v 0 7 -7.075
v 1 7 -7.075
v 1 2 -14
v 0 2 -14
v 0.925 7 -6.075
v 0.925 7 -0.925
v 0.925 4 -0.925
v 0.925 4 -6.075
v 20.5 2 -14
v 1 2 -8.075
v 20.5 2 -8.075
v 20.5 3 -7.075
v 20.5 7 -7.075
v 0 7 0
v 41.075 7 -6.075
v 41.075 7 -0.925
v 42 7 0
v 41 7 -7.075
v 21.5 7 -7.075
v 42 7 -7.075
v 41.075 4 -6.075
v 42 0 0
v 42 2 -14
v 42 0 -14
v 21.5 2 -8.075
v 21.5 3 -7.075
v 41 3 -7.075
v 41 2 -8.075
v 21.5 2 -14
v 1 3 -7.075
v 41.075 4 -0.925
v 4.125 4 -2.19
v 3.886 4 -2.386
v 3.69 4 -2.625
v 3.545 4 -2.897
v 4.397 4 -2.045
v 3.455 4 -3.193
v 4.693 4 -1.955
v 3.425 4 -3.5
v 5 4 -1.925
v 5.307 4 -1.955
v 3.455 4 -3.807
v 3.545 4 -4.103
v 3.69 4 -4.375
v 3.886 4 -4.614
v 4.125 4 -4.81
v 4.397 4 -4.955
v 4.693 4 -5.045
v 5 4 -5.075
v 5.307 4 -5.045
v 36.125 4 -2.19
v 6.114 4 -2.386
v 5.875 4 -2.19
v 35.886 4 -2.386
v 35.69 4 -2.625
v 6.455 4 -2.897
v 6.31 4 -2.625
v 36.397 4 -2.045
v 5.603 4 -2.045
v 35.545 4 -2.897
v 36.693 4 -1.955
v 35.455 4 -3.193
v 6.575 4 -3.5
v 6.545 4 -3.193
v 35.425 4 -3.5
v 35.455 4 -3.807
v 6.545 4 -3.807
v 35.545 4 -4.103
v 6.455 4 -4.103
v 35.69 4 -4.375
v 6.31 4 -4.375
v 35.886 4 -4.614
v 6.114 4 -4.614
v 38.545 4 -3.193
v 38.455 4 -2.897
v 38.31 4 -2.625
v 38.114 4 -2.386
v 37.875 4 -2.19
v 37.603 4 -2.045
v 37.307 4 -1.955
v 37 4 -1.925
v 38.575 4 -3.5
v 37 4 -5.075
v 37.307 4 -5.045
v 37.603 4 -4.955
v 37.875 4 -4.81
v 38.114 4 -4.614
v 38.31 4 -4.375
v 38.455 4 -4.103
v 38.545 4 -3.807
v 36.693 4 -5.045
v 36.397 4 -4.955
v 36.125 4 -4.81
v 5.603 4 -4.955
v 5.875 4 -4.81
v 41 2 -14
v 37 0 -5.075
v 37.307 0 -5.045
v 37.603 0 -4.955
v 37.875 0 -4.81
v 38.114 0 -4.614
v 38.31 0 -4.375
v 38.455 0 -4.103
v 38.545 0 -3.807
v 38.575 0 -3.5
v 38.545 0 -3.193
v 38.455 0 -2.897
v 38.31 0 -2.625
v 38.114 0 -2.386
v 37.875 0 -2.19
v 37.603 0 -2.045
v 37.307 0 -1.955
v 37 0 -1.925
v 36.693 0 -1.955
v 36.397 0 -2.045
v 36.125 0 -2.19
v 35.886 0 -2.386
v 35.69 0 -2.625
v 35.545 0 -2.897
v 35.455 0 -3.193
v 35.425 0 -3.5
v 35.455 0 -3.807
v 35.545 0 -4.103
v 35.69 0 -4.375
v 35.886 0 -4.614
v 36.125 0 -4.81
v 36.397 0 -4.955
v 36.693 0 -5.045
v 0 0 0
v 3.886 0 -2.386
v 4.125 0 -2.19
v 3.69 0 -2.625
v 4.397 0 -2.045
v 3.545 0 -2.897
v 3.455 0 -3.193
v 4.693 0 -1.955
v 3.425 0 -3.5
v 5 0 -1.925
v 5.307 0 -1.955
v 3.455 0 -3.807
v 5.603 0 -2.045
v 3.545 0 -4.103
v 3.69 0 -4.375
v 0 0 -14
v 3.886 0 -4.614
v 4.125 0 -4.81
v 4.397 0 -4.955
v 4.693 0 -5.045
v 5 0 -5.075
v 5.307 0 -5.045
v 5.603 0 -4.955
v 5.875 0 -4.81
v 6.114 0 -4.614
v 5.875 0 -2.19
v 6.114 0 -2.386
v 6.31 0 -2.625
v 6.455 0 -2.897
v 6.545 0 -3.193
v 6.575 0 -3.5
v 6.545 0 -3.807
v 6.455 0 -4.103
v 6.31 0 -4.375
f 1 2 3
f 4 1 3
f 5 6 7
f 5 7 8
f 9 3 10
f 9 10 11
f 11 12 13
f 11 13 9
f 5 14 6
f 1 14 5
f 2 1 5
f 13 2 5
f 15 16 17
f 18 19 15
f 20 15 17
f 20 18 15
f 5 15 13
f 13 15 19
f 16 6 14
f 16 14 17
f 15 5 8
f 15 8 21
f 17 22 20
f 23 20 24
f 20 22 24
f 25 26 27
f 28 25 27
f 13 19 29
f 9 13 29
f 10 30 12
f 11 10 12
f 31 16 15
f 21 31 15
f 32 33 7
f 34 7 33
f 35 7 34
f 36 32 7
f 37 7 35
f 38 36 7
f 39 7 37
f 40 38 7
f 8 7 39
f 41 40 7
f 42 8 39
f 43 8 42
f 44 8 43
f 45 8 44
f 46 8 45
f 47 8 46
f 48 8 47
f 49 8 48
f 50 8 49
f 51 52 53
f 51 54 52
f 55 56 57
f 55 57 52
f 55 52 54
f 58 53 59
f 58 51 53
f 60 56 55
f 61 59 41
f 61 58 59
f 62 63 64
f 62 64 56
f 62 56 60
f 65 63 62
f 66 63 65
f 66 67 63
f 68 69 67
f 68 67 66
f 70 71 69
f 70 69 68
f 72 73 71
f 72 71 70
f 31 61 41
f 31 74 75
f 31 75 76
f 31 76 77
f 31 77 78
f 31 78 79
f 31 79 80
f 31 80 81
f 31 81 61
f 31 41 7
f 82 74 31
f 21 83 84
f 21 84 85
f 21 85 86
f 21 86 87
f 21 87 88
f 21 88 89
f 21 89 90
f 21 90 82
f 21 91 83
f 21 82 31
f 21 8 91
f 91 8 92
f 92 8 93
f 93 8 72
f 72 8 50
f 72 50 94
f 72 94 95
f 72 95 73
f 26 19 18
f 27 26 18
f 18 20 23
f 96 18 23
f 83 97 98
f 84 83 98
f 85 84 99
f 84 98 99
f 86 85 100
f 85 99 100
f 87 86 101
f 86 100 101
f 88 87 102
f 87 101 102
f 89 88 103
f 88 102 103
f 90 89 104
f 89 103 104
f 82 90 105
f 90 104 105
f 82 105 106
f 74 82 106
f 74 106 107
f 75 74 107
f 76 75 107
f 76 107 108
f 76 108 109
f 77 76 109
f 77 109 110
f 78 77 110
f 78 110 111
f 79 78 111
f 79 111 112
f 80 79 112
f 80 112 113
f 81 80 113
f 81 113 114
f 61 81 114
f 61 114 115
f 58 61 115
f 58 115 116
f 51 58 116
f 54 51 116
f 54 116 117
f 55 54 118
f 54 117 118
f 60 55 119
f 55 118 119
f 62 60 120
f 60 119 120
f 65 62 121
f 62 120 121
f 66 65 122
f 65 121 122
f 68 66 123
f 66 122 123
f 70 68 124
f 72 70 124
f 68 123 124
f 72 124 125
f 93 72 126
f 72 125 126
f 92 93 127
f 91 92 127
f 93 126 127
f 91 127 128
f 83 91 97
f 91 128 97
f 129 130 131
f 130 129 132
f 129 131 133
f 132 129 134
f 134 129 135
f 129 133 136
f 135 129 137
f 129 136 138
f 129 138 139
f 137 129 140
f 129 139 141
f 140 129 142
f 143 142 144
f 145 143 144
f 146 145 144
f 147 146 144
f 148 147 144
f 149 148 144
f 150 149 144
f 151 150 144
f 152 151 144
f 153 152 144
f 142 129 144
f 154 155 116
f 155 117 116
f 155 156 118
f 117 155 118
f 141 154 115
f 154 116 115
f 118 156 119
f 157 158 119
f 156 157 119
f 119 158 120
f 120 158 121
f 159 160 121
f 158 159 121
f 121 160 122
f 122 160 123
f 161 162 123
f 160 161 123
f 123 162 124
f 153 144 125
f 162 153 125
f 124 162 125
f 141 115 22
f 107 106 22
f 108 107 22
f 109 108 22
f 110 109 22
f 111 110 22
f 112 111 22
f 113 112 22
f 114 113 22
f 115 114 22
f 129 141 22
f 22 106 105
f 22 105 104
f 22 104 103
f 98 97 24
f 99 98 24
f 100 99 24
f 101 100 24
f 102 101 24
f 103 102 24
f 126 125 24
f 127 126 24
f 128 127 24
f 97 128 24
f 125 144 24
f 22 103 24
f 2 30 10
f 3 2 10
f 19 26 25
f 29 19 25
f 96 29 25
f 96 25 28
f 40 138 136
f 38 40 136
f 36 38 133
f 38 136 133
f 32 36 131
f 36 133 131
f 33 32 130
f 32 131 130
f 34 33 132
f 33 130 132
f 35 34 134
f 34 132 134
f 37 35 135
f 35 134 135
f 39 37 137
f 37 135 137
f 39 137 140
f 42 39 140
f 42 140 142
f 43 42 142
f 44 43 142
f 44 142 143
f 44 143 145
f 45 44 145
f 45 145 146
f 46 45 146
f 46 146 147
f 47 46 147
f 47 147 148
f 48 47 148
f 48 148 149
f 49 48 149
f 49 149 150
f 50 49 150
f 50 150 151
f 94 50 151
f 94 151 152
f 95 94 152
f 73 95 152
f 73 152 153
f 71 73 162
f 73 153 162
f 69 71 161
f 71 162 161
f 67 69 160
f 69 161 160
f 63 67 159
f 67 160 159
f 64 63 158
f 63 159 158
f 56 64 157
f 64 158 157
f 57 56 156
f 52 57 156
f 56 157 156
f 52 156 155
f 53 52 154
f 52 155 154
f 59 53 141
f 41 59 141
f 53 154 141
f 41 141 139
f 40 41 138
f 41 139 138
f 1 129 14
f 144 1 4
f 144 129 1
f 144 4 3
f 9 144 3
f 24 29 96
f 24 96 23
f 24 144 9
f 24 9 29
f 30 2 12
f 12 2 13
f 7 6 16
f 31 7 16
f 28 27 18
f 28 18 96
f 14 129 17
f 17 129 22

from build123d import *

# Parameters (mm, degrees)
SKETCH1_W               = 42
SKETCH1_H               = 7
RISER_DEPTH             = 7
SKETCH2_R               = 1.575
MOUNTING_HOLES_DEPTH    = 44.150898021
SKETCH3_W               = 40.15
SKETCH3_H               = 5.15
RECESS_DEPTH            = 3
SKETCH4_W               = 42
SKETCH4_H               = 7
FLANGE_DEPTH            = 7
SKETCH5_W               = 19.5
SKETCH5_H               = 6.925
FLANGE_CUTOUT_DEPTH     = 5
ANGLE_CUTOUT_DEPTH      = 27.594172294
ANGLE_CUTOUT_DEPTH_BACK = 27.594172294
FLANGE_CHAMFER_1_SIZE   = 1
FLANGE_CHAMFER_2_SIZE   = 1


with BuildPart() as part:
    # Sketch1 → Riser (new body)
    with BuildSketch(Plane(origin=(0, 0, 0), x_dir=(1, 0, 0), z_dir=(0, 1, 0))):
        with Locations((21, 3.5)):
            Rectangle(SKETCH1_W, SKETCH1_H)
    extrude(amount=RISER_DEPTH)

    # Sketch2 → Mounting Holes (cut, through all)
    with BuildSketch(Plane.XZ):
        with Locations(Location((5, -3.5, 0), (0, 0, 90))):
            Circle(SKETCH2_R)
        with Locations(Location((37, -3.5, 0), (0, 0, 270))):
            Circle(SKETCH2_R)
    extrude(amount=-MOUNTING_HOLES_DEPTH, mode=Mode.SUBTRACT)

    # Sketch3 → Recess (cut)
    with BuildSketch(Plane(origin=(0, 7, 0), x_dir=(1, 0, 0), z_dir=(0, 1, 0))):
        with Locations((21, 3.5)):
            Rectangle(SKETCH3_W, SKETCH3_H)
    extrude(amount=-RECESS_DEPTH, mode=Mode.SUBTRACT)

    # Sketch4 → Flange (add)
    with BuildSketch(Plane(origin=(0, 0, 0), x_dir=(1, 0, 0), z_dir=(0, 1, 0))):
        with Locations((21, 10.5)):
            Rectangle(SKETCH4_W, SKETCH4_H)
    extrude(amount=FLANGE_DEPTH)

    # Sketch5 → Flange Cutout (cut)
    with BuildSketch(Plane(origin=(0, 7, 0), x_dir=(1, 0, 0), z_dir=(0, 1, 0))):
        with Locations((10.75, 10.5375)):
            Rectangle(SKETCH5_W, SKETCH5_H)
        with Locations((31.25, 10.5375)):
            Rectangle(SKETCH5_W, SKETCH5_H)
    extrude(amount=-FLANGE_CUTOUT_DEPTH, mode=Mode.SUBTRACT)

    # Sketch7 → Angle Cutout (cut, two sides: drawn at the far end of the back side and taken through both)
    with BuildSketch(Plane.ZY.offset(-20.5).offset(-ANGLE_CUTOUT_DEPTH_BACK)):
        Polygon((-7.075, 7), (-14, 2), (-14, 7), align=None)
    extrude(amount=ANGLE_CUTOUT_DEPTH + ANGLE_CUTOUT_DEPTH_BACK, mode=Mode.SUBTRACT)

    # Flange Chamfer 1
    flange_chamfer_1_edges = [part.edges().sort_by_distance(p)[0] for p in [
        (10.75, 2, -7.075),
    ]]
    chamfer(flange_chamfer_1_edges, length=FLANGE_CHAMFER_1_SIZE)

    # Flange Chamfer 2
    flange_chamfer_2_edges = [part.edges().sort_by_distance(p)[0] for p in [
        (31.25, 2, -7.075),
    ]]
    chamfer(flange_chamfer_2_edges, length=FLANGE_CHAMFER_2_SIZE)


solid = part.part
